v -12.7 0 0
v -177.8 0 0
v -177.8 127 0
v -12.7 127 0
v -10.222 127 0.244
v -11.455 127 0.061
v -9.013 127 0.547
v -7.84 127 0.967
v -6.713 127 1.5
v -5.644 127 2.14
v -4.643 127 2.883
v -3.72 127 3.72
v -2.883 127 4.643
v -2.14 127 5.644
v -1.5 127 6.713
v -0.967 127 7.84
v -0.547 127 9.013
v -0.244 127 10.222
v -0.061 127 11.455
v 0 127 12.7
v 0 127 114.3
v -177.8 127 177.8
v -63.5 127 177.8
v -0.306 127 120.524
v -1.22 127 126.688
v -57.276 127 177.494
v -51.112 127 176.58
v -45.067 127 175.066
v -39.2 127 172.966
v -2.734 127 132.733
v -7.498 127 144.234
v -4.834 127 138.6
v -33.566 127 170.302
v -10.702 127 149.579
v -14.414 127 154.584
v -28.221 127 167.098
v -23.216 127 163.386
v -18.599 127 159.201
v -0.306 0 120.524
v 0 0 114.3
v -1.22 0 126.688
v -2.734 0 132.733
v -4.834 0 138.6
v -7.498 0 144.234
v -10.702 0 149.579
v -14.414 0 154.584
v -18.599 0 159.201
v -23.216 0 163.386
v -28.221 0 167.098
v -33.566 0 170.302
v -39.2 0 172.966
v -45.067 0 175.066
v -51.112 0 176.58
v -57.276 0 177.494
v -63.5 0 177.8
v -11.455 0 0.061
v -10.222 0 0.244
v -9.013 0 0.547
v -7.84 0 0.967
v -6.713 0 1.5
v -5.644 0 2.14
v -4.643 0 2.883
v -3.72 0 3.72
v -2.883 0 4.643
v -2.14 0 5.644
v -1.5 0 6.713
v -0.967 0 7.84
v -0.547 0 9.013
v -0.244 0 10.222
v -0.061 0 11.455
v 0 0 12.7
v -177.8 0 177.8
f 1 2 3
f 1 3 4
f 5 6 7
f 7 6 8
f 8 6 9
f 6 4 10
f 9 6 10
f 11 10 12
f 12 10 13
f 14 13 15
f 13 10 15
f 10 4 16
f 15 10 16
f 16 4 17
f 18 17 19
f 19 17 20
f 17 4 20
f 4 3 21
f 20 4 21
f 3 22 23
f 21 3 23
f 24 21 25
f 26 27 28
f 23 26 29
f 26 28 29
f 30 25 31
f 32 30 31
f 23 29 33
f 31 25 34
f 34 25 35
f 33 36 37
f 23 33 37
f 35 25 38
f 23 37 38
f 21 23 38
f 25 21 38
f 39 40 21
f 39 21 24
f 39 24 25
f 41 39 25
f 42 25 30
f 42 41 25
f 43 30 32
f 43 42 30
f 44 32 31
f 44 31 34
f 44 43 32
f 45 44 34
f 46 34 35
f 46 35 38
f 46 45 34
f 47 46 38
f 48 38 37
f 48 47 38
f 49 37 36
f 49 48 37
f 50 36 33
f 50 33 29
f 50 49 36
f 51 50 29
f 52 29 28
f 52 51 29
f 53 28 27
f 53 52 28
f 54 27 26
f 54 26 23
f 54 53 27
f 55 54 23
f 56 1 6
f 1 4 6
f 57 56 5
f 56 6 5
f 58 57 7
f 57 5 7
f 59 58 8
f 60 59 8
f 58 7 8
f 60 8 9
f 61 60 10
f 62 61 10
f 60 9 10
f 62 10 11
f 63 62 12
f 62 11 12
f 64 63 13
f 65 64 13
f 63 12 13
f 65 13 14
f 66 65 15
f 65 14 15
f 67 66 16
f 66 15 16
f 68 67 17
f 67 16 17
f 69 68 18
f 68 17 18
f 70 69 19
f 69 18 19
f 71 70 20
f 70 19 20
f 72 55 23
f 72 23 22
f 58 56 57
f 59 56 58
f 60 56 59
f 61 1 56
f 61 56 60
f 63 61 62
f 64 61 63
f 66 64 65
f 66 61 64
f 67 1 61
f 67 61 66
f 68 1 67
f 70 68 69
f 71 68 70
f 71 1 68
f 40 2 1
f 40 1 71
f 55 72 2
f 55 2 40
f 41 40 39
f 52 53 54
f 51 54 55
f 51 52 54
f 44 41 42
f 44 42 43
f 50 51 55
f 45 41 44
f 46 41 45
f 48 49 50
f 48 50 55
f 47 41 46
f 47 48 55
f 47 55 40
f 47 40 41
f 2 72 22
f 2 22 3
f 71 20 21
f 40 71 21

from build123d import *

# Parameters (mm, degrees)
F1_DEPTH = 127
F2_R     = 12.7


with BuildPart() as f1:
    # F0 (on Front) → F1 (new body)
    with BuildSketch(Plane.XZ):
        with BuildLine():
            Line((-63.5, 177.8), (-177.8, 177.8))
            Line((-177.8, 177.8), (-177.8, 0))
            Line((-177.8, 0), (0, 0))
            Line((0, 0), (0, 114.3))
            ThreePointArc((0, 114.3), (-18.598719, 159.201281), (-63.5, 177.8))
        make_face()
    extrude(amount=-F1_DEPTH)

    # F2
    f2_edges = [f1.edges().sort_by_distance(p)[0] for p in [
        (0, 63.5, 0),
    ]]
    fillet(f2_edges, radius=F2_R)


solid = f1.part
